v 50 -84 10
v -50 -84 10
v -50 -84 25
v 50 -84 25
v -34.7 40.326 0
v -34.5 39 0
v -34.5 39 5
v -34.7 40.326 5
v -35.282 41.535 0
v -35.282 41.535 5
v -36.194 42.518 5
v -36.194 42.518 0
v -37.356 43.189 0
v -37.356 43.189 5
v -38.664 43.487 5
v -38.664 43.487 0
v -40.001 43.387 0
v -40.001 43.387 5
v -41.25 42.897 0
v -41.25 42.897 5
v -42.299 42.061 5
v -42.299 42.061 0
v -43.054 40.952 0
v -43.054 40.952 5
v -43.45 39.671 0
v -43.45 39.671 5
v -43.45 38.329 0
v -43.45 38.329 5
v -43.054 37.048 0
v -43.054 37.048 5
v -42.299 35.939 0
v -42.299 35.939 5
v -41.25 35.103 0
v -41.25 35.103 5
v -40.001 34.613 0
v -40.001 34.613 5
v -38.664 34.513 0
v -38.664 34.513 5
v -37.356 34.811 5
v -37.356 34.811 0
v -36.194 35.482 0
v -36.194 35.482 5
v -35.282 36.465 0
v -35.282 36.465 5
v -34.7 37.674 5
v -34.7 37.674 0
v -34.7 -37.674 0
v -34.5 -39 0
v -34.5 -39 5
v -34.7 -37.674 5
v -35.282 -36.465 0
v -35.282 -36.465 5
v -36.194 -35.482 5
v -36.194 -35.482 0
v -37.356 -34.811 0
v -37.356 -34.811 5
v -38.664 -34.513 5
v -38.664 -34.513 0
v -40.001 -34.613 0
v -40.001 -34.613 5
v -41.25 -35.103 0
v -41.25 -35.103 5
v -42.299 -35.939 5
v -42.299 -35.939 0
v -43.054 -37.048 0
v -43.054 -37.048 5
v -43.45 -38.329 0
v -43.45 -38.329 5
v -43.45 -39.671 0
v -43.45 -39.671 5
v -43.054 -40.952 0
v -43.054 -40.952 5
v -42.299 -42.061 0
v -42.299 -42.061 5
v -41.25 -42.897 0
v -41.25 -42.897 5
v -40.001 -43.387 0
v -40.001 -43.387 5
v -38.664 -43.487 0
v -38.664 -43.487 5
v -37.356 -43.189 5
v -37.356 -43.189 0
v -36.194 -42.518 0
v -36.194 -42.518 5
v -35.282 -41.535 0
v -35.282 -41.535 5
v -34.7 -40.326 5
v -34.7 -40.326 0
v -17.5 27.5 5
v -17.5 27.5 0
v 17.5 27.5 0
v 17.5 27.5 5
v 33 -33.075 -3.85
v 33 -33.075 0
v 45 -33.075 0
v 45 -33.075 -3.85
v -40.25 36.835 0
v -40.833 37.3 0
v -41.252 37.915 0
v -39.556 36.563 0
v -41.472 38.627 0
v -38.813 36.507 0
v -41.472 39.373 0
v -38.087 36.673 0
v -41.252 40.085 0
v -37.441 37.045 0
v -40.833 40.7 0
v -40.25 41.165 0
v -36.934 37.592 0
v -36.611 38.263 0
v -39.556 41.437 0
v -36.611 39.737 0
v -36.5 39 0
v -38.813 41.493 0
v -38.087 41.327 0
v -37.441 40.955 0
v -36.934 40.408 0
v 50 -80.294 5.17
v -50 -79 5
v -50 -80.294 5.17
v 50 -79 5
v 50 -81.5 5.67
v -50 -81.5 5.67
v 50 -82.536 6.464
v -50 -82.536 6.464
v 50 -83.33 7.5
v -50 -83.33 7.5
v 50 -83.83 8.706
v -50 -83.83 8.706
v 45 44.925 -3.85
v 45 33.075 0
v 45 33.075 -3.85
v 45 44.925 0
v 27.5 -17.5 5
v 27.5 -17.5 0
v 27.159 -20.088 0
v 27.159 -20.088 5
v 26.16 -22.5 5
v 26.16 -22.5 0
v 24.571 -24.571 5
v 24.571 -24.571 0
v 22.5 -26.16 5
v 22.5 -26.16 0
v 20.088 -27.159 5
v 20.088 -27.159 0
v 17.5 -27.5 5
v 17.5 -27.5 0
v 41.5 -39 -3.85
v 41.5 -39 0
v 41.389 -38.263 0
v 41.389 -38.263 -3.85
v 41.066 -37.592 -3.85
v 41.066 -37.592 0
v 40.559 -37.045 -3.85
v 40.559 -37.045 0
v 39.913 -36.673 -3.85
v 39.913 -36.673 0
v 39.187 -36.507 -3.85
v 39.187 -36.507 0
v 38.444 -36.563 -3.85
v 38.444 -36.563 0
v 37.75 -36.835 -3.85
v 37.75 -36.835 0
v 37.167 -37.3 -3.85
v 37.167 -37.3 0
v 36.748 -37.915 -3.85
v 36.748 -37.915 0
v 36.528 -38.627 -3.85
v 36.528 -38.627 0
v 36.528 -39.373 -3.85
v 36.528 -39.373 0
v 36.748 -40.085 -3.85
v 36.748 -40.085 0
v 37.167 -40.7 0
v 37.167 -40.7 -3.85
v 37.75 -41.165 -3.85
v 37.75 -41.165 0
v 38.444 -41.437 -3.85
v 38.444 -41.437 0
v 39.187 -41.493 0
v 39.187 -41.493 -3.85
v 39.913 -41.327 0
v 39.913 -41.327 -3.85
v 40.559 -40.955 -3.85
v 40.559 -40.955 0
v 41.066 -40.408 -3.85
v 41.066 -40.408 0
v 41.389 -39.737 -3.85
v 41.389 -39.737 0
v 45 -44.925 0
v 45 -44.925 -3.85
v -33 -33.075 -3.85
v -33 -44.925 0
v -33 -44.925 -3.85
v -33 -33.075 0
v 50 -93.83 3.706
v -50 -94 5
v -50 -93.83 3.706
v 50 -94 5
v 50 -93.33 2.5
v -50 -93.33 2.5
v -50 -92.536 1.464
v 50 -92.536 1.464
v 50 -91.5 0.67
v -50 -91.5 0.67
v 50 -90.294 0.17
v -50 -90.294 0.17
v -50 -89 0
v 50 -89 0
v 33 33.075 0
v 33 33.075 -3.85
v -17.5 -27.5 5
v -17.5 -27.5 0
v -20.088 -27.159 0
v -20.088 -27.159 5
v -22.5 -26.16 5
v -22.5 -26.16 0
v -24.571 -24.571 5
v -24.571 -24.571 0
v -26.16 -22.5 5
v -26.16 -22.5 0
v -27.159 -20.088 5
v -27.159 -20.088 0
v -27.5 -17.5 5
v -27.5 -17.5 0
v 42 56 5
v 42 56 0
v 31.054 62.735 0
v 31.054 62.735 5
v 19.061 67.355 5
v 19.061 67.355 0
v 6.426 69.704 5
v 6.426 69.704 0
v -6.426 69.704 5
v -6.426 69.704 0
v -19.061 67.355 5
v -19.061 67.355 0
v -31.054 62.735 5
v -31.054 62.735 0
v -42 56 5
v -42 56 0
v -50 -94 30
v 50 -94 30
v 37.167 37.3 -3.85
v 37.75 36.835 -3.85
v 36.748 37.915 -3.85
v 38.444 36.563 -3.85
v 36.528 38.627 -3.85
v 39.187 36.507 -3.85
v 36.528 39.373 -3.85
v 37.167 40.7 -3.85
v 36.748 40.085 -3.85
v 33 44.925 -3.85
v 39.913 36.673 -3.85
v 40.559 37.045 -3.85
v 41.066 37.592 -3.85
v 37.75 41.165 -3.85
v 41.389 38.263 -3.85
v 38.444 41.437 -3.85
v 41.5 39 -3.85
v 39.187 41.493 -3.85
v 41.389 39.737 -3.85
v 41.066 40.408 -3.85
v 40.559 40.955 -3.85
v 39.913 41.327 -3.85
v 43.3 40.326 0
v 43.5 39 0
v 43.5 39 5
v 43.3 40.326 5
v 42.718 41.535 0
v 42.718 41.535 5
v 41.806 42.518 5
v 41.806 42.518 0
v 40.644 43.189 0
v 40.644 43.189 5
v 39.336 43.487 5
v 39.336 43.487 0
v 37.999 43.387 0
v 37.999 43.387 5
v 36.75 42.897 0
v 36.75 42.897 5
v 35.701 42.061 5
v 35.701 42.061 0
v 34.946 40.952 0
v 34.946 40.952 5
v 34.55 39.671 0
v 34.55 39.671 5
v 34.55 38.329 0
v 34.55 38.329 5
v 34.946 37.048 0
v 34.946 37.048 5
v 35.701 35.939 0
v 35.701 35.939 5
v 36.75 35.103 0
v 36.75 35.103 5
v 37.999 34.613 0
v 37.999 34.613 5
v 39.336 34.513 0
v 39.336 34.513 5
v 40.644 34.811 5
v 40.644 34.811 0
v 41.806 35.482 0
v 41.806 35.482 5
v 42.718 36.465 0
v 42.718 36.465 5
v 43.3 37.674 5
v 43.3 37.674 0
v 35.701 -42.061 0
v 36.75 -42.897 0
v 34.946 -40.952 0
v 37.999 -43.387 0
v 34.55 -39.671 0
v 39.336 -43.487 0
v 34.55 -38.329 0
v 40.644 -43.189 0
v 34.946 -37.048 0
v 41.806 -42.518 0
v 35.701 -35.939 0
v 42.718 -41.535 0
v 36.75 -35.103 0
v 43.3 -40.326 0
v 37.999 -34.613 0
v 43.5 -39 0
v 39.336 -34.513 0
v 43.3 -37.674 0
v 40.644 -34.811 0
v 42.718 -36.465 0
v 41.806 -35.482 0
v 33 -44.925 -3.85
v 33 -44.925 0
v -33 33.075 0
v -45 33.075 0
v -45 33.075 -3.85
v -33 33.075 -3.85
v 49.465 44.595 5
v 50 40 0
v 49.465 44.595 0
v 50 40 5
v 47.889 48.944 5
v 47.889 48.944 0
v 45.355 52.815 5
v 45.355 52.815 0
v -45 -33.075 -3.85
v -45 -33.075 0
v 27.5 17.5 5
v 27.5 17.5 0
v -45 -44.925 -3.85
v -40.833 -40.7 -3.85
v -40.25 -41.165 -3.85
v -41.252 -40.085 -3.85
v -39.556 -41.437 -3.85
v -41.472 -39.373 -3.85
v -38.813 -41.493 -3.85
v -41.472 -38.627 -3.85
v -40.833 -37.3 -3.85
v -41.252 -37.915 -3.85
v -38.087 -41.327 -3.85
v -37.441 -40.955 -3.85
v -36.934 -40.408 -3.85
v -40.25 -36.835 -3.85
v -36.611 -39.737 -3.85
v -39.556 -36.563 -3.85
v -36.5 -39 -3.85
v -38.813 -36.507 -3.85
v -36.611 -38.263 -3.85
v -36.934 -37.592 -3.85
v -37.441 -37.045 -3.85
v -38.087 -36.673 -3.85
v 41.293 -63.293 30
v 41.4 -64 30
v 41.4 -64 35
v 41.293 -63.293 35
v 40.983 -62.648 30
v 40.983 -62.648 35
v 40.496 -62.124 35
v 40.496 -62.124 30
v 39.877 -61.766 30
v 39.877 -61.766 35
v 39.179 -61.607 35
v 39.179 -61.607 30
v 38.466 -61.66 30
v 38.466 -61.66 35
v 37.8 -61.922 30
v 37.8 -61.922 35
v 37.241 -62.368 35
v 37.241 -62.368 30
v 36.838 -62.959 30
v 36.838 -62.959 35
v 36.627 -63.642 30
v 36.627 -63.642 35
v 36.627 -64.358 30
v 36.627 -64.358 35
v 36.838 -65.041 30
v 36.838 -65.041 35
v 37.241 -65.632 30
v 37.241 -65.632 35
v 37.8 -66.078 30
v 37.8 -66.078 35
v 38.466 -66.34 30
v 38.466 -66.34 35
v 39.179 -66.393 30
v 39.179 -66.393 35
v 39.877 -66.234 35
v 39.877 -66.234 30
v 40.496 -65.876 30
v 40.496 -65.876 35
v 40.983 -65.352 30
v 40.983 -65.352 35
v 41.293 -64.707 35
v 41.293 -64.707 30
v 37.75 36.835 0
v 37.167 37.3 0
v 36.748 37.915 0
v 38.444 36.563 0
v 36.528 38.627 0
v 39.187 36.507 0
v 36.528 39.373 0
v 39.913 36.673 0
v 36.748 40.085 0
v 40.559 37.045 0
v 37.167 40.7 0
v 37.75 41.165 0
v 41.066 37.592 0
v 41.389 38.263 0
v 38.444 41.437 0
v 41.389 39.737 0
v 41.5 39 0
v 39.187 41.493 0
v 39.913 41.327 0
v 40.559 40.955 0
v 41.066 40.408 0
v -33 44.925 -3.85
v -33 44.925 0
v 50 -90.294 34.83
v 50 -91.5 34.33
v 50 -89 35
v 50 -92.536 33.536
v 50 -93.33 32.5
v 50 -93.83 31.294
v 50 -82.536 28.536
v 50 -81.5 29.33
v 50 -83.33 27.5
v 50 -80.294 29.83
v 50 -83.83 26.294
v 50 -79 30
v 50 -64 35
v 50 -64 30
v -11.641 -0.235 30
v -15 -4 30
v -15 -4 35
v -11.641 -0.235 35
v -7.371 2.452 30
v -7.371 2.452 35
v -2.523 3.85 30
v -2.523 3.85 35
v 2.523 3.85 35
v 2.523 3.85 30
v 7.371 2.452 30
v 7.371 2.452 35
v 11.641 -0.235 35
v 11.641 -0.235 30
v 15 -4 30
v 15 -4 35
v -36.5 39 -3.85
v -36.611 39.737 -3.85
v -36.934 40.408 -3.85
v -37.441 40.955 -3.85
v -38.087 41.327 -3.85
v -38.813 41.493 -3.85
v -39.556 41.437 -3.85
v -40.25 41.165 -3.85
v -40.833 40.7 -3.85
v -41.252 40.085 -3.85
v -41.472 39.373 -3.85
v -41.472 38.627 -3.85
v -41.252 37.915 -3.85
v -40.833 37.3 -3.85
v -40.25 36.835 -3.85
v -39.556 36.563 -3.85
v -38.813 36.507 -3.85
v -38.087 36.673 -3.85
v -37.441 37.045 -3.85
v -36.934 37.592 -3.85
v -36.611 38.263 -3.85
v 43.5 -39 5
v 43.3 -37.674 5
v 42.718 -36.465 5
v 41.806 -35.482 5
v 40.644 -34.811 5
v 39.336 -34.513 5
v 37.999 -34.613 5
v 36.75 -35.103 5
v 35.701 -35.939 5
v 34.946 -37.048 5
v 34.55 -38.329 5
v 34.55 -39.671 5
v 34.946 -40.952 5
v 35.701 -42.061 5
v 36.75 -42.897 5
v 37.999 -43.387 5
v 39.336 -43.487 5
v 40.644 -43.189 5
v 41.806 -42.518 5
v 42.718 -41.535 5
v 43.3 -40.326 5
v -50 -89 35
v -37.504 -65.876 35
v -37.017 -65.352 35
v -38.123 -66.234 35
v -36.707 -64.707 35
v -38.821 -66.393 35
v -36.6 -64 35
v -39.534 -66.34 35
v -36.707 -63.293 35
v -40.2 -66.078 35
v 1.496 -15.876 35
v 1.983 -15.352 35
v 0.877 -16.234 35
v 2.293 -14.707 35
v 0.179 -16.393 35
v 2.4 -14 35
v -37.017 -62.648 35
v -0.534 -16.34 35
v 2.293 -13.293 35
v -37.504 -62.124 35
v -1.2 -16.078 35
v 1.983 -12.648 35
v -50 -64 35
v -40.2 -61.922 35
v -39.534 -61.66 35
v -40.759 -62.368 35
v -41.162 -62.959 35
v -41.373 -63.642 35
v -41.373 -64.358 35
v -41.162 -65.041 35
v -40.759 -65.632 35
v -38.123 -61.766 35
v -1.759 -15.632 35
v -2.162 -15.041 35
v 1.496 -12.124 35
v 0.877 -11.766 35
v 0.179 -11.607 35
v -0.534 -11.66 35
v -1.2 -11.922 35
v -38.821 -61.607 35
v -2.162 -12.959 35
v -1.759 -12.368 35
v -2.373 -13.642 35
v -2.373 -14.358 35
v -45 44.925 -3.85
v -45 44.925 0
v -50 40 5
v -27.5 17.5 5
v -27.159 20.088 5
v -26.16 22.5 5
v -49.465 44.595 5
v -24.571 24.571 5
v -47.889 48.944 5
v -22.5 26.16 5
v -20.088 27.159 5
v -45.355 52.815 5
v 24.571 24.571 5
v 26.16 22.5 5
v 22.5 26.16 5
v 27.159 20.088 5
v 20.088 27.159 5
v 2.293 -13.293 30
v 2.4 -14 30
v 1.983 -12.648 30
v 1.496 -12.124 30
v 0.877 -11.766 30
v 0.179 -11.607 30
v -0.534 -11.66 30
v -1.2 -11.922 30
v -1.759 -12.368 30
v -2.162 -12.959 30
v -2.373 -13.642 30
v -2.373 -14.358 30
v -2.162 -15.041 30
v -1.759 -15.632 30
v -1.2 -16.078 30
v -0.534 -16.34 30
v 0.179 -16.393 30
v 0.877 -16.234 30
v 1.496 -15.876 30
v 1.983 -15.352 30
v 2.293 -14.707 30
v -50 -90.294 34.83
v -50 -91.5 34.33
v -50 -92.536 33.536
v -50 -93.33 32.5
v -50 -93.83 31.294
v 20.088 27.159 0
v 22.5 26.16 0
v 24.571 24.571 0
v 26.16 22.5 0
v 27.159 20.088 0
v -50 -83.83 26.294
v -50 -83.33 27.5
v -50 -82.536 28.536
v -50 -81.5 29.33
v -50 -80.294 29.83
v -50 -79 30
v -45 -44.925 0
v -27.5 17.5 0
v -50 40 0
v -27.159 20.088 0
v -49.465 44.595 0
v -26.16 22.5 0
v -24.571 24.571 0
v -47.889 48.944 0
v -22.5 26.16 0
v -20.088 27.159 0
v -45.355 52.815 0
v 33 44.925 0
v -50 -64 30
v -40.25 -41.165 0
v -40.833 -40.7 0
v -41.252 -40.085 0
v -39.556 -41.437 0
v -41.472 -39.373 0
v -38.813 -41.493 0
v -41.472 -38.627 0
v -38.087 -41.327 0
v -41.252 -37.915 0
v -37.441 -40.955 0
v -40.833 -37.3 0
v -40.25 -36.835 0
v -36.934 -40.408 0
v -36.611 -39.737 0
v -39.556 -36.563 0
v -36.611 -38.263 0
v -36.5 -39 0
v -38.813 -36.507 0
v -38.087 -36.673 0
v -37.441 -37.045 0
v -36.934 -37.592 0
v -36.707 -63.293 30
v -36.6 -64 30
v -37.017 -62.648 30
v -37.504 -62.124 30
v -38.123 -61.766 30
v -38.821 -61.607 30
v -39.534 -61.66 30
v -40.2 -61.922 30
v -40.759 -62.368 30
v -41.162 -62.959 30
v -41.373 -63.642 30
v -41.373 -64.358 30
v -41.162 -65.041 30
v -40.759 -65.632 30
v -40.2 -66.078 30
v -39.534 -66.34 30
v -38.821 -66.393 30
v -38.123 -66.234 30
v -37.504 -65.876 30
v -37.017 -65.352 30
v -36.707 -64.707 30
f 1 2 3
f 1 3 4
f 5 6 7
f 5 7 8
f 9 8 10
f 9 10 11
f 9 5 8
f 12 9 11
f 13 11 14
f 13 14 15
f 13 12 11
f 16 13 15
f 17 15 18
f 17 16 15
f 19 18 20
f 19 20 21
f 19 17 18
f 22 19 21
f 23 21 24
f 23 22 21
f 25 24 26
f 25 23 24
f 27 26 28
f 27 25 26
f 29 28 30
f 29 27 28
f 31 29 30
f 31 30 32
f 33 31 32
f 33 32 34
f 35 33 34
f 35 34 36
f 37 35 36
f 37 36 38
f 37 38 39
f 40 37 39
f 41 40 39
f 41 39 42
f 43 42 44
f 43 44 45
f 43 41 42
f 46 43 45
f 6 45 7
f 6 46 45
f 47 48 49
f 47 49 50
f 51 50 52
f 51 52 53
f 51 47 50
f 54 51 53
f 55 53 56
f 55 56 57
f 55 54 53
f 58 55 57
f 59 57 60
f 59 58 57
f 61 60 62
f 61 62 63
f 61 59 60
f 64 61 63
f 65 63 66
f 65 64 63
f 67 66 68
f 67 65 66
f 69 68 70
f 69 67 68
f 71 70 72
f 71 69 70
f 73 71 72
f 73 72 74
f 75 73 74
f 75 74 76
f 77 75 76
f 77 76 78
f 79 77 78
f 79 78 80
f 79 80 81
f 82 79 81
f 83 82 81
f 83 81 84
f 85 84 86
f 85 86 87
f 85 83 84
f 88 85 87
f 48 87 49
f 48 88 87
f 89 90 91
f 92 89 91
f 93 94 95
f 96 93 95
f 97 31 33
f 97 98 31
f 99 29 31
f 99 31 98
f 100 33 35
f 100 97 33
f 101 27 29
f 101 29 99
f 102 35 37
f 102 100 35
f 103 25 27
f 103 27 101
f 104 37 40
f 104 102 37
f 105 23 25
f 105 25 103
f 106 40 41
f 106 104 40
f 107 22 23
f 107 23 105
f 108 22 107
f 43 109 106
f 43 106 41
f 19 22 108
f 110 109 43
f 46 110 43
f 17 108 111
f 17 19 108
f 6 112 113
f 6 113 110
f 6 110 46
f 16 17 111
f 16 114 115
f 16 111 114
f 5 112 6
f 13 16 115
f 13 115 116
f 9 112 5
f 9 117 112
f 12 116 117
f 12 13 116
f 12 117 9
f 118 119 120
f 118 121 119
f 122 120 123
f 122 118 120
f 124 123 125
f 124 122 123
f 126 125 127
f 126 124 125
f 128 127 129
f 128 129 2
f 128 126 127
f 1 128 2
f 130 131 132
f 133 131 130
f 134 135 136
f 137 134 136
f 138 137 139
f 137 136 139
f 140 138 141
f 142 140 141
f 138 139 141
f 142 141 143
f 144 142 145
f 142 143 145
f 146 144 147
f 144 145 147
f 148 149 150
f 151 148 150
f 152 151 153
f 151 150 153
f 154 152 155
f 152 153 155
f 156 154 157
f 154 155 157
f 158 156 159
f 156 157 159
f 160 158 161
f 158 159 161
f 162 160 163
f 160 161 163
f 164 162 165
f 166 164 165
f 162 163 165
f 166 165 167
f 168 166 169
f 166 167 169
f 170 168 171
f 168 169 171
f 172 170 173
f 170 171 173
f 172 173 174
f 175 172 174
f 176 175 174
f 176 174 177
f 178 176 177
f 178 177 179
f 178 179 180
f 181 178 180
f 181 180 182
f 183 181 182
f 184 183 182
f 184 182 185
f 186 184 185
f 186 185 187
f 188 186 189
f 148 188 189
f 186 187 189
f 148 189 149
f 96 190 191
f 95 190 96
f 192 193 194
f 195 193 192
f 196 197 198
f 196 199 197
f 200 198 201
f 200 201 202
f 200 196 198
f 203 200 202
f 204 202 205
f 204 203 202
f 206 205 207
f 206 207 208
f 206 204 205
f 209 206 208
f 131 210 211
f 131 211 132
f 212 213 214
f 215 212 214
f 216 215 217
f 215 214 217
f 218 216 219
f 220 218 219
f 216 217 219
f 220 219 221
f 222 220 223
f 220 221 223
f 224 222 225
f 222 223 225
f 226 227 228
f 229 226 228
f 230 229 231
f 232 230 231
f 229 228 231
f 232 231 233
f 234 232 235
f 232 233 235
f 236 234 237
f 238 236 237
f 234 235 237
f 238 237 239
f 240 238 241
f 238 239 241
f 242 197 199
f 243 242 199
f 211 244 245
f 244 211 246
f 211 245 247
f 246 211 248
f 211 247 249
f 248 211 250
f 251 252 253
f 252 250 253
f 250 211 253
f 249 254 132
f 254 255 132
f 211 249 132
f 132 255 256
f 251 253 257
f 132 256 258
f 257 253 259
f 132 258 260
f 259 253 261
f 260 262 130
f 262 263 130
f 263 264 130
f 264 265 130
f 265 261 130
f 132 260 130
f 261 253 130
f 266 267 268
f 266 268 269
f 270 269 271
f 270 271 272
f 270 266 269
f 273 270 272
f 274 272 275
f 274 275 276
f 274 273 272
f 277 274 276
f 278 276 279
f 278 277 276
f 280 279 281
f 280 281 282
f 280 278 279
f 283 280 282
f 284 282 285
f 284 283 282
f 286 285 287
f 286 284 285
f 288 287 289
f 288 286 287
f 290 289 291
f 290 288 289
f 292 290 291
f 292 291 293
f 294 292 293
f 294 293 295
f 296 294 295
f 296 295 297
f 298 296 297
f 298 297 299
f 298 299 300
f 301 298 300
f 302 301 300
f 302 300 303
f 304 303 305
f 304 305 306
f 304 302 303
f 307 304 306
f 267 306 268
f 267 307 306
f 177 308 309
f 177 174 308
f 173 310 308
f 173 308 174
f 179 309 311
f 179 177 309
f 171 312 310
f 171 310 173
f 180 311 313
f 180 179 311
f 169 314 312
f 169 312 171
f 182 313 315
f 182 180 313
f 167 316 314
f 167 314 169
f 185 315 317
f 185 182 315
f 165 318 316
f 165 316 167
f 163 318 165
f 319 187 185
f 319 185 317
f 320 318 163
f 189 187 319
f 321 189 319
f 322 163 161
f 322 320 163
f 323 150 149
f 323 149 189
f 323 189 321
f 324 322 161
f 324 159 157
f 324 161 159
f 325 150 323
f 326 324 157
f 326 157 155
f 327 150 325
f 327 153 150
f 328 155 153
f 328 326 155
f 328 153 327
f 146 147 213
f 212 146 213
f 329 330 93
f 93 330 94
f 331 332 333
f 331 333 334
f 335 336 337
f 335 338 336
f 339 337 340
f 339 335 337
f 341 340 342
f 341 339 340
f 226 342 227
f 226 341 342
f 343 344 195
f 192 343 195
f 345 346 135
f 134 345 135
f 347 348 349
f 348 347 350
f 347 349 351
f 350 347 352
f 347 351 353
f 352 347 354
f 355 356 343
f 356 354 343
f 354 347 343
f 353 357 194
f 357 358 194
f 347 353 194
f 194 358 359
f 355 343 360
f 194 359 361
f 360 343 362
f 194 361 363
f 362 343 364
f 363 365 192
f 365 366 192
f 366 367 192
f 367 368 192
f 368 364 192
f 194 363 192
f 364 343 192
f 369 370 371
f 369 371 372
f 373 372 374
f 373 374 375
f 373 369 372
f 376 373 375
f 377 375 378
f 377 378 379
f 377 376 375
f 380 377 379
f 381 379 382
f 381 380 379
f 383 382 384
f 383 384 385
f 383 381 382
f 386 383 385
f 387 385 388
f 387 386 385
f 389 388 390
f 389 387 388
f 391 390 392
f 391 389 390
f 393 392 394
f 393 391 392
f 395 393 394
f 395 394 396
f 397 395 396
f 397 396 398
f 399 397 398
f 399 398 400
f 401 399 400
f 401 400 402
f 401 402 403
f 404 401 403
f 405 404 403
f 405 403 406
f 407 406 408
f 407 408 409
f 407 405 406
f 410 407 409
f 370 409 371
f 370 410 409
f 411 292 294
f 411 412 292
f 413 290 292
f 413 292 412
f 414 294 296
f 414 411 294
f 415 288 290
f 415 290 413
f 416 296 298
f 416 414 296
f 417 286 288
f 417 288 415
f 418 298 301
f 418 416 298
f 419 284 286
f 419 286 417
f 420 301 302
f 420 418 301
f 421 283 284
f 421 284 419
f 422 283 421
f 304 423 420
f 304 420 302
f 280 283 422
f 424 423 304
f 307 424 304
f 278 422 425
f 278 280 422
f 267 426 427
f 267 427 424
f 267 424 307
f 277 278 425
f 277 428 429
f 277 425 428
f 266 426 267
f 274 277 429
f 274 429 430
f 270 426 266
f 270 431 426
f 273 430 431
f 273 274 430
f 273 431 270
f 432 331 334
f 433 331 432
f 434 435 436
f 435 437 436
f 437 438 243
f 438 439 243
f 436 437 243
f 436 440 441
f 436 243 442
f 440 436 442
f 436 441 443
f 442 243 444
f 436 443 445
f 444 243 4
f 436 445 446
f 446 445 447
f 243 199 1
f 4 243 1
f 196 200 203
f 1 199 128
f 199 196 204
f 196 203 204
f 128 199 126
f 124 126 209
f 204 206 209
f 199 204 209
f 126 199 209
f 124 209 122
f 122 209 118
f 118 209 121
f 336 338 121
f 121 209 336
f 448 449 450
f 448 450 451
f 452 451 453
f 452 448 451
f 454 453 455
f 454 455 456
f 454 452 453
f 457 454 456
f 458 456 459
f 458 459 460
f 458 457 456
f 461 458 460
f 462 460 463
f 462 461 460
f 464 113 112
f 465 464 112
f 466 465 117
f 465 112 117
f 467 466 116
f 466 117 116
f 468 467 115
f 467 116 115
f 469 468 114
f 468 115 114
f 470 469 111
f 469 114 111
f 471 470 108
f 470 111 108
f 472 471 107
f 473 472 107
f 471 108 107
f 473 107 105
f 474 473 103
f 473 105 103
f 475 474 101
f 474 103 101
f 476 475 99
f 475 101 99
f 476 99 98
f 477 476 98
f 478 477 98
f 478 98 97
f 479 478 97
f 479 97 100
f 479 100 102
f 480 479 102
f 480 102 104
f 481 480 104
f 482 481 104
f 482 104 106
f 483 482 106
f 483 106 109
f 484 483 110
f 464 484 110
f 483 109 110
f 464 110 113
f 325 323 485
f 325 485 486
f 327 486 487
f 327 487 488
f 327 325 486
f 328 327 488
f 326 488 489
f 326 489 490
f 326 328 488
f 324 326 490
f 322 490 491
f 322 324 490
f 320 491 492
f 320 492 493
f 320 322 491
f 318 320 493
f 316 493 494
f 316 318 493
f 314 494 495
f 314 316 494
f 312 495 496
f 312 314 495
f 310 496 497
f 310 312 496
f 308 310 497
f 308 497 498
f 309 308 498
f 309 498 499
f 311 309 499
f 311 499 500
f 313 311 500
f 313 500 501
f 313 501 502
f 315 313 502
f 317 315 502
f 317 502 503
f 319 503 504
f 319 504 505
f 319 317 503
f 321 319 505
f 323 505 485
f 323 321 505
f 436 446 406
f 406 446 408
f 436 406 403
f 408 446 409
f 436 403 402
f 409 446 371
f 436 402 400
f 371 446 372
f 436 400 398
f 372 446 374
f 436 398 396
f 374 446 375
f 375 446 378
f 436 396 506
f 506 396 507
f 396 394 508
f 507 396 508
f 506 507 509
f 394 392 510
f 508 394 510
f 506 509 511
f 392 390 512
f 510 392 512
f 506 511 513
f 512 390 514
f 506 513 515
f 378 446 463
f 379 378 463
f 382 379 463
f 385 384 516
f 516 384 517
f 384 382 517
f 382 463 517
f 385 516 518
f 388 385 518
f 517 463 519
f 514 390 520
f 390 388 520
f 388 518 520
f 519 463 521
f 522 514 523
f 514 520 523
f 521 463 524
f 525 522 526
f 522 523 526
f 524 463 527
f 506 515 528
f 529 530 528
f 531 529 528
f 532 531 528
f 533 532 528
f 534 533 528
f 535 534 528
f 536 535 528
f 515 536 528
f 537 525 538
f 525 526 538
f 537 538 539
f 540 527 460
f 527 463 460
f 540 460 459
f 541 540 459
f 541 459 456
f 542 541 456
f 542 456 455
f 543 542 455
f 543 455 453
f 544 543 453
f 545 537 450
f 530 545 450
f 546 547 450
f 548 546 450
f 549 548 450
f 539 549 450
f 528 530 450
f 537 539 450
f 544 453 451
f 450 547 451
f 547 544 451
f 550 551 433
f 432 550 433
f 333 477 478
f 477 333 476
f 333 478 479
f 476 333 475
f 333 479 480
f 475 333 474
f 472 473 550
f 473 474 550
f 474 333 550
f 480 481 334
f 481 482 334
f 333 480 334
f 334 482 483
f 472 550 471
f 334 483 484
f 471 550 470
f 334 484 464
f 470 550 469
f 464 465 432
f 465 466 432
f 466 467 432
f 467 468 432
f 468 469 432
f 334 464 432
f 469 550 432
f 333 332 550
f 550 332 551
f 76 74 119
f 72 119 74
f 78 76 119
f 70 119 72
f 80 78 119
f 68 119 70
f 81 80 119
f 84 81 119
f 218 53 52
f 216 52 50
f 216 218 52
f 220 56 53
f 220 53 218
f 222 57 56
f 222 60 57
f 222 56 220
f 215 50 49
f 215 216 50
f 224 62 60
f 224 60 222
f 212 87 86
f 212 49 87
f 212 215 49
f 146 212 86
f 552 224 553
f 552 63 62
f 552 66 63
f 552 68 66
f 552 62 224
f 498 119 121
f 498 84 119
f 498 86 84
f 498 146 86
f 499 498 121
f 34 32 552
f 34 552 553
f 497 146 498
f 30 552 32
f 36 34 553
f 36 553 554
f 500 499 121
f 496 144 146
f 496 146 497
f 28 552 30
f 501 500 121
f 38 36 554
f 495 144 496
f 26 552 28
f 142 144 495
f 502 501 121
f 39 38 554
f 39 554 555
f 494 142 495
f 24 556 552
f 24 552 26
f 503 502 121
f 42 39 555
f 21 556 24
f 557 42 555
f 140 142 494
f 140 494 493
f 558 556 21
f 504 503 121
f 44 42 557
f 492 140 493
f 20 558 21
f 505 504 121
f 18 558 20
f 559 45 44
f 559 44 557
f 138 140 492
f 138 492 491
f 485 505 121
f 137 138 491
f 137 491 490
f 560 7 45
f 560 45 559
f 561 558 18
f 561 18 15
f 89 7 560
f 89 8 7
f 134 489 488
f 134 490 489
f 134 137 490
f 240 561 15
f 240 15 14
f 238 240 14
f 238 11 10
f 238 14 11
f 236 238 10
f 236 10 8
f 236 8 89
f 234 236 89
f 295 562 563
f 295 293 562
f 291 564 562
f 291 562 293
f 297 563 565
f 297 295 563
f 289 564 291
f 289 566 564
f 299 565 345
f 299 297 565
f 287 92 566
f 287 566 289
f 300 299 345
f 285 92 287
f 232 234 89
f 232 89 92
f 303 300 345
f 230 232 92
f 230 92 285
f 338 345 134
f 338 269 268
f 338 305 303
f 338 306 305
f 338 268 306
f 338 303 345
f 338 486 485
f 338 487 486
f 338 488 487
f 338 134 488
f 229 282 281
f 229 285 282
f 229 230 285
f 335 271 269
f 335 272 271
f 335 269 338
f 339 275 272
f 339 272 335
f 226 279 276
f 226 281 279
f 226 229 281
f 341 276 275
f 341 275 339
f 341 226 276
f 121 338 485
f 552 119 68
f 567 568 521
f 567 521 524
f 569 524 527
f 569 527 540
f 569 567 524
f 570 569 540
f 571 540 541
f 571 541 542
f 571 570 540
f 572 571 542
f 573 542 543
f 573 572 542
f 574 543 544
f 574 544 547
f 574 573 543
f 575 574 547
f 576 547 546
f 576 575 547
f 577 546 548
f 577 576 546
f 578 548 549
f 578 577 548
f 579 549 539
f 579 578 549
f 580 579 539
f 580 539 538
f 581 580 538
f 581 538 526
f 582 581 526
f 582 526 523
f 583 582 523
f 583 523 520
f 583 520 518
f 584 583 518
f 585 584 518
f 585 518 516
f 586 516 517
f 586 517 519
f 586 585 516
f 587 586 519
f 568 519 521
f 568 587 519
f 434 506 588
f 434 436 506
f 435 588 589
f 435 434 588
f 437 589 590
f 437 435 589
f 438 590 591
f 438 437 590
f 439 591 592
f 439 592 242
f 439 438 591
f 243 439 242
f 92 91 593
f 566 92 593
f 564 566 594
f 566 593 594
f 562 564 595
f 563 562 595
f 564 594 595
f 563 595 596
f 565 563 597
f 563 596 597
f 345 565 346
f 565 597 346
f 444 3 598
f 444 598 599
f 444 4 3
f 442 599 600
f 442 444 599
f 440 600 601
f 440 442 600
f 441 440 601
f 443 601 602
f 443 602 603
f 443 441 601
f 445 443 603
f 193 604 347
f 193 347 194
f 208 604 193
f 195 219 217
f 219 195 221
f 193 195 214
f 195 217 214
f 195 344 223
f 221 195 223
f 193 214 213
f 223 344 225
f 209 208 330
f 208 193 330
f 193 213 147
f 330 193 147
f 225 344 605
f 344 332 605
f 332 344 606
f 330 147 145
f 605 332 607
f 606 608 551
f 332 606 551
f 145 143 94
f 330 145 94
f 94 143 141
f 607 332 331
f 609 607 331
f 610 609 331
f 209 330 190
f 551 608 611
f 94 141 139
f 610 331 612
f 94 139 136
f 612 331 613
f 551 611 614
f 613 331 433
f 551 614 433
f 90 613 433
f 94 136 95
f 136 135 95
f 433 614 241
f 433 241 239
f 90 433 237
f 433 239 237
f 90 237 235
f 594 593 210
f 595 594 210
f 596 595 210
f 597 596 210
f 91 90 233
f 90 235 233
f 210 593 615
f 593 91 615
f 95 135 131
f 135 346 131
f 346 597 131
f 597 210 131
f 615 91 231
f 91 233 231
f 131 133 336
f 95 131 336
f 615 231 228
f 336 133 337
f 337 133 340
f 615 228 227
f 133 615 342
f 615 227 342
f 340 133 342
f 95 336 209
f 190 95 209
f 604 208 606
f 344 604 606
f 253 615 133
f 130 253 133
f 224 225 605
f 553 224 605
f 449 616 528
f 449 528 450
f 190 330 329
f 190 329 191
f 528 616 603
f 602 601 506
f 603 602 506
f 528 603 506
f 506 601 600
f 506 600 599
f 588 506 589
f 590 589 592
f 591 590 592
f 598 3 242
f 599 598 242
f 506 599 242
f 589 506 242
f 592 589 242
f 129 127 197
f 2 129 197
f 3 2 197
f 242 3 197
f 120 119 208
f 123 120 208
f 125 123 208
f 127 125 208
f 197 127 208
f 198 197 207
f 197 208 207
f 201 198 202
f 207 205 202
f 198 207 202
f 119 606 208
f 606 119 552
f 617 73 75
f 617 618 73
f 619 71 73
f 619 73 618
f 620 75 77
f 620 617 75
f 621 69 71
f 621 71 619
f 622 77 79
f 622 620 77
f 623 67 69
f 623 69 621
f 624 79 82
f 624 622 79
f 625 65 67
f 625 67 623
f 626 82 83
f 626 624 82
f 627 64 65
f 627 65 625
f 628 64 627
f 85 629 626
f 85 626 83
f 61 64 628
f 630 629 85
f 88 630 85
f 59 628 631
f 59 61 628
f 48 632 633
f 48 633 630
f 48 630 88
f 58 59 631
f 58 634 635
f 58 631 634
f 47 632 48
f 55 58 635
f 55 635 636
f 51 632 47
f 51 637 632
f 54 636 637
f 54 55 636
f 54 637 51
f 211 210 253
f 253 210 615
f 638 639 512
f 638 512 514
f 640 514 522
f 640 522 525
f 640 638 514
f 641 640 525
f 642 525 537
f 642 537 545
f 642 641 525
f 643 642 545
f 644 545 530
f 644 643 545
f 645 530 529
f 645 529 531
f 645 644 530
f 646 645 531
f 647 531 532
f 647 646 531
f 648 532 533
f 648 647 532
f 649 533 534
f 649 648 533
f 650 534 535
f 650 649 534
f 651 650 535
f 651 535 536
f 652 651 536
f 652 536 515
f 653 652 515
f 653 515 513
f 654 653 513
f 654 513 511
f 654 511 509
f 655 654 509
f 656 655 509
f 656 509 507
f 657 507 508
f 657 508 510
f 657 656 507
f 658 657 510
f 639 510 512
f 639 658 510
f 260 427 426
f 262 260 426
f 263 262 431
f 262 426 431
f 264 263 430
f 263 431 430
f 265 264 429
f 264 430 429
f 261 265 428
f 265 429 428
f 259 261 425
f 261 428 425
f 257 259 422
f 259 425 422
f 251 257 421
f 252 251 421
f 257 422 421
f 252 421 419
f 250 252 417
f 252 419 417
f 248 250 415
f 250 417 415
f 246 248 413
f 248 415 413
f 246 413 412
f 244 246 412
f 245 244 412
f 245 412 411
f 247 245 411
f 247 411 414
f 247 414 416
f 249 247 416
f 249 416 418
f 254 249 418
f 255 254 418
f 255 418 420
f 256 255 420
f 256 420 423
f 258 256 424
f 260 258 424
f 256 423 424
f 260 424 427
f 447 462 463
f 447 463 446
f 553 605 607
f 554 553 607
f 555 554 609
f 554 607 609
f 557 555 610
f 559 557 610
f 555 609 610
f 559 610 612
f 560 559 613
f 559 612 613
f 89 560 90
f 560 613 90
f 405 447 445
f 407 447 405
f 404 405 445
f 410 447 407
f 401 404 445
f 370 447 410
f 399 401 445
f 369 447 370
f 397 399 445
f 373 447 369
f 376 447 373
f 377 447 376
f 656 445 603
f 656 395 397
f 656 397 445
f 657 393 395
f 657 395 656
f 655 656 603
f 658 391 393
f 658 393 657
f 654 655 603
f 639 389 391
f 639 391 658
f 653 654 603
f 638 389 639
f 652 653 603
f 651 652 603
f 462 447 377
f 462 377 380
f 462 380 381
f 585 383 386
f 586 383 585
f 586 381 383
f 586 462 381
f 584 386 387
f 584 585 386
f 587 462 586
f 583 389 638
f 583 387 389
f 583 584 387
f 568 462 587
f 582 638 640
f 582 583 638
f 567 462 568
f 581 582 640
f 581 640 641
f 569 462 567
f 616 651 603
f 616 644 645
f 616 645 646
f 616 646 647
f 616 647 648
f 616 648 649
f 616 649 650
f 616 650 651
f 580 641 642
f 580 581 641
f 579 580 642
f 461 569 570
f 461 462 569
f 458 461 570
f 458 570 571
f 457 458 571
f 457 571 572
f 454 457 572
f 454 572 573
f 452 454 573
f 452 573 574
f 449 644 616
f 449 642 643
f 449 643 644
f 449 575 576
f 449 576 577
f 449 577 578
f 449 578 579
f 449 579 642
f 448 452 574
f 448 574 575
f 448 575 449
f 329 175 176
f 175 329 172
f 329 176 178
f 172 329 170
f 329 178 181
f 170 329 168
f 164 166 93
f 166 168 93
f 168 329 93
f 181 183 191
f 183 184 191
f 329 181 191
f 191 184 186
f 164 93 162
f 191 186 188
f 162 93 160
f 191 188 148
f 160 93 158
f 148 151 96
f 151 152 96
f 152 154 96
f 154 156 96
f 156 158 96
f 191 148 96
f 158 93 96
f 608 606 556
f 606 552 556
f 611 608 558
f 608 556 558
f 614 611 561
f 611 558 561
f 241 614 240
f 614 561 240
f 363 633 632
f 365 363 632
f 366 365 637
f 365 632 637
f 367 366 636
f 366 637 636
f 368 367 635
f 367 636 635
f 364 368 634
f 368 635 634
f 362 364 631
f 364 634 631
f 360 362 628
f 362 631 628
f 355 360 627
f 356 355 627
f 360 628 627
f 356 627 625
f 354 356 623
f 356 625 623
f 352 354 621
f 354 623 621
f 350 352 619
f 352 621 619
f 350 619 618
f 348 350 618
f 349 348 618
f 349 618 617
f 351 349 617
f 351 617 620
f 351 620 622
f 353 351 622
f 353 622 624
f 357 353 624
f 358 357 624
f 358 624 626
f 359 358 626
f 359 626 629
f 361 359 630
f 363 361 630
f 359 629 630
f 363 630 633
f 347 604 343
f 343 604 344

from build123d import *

# Parameters (mm, degrees)
SKETCH_1_R          = 4.5
EXTRUDE_2_DEPTH     = 5
FILLET1_R           = 20
SKETCH_1_5_W        = 12
SKETCH_1_5_H        = 11.85
SKETCH_1_5_R        = 2.5
BOSS_EXTRUDE1_DEPTH = 3.85
BOSS_EXTRUDE3_DEPTH = 5
SKETCH1_3_W         = 100
SKETCH1_3_H         = 10
BOSS_EXTRUDE4_DEPTH = 30
SKETCH2_R           = 2.4
BOSS_EXTRUDE5_DEPTH = 5
FILLET2_R           = 5


with BuildPart() as part:
    # Эскиз1 → Extrude 2 (new body)
    with BuildSketch(Plane.XY):
        with BuildLine():
            ThreePointArc((-50, -48.989794856), (0, -70), (50, -48.989794856))
            Line((50, -48.989794856), (50, 48.989794856))
            ThreePointArc((50, 48.989794856), (0, 70), (-50, 48.989794856))
            Line((-50, 48.989794856), (-50, -48.989794856))
        make_face()
        with BuildLine():
            ThreePointArc((27.5, -17.5), (24.571067812, -24.571067812), (17.5, -27.5))
            Line((17.5, -27.5), (-17.5, -27.5))
            ThreePointArc((-17.5, -27.5), (-24.571067812, -24.571067812), (-27.5, -17.5))
            Line((-27.5, -17.5), (-27.5, 17.5))
            ThreePointArc((-27.5, 17.5), (-24.571067812, 24.571067812), (-17.5, 27.5))
            Line((-17.5, 27.5), (17.5, 27.5))
            ThreePointArc((17.5, 27.5), (24.571067812, 24.571067812), (27.5, 17.5))
            Line((27.5, 17.5), (27.5, -17.5))
        make_face(mode=Mode.SUBTRACT)
        with Locations((-39, -39)):
            Circle(SKETCH_1_R, mode=Mode.SUBTRACT)
        with Locations((-39, 39)):
            Circle(SKETCH_1_R, mode=Mode.SUBTRACT)
        with Locations((39, 39)):
            Circle(SKETCH_1_R, mode=Mode.SUBTRACT)
        with Locations((39, -39)):
            Circle(SKETCH_1_R, mode=Mode.SUBTRACT)
    extrude(amount=EXTRUDE_2_DEPTH)

    # Fillet1
    fillet1_edges = [part.edges().sort_by_distance(p)[0] for p in [
        (50, -48.989794856, 2.5),
        (-50, -48.989794856, 2.5),
        (-50, 48.989794856, 2.5),
        (50, 48.989794856, 2.5),
    ]]
    fillet(fillet1_edges, radius=FILLET1_R)

    # Эскиз1<5> → Boss-Extrude1 (add)
    # profile 1 of 4: a face of its own
    with BuildSketch(Plane.XY):
        with Locations((39, -39)):
            Rectangle(SKETCH_1_5_W, SKETCH_1_5_H)
        with Locations((39, -39)):
            Circle(SKETCH_1_5_R, mode=Mode.SUBTRACT)
    # profile 2 of 4: a face of its own
    with BuildSketch(Plane.XY):
        with Locations((-39, -39)):
            Rectangle(SKETCH_1_5_W, SKETCH_1_5_H)
        with Locations((-39, -39)):
            Circle(SKETCH_1_5_R, mode=Mode.SUBTRACT)
    # profile 3 of 4: a face of its own
    with BuildSketch(Plane.XY):
        with Locations((39, 39)):
            Rectangle(SKETCH_1_5_W, SKETCH_1_5_H)
        with Locations((39, 39)):
            Circle(SKETCH_1_5_R, mode=Mode.SUBTRACT)
    # profile 4 of 4: a face of its own
    with BuildSketch(Plane.XY):
        with Locations((-39, 39)):
            Rectangle(SKETCH_1_5_W, SKETCH_1_5_H)
        with Locations((-39, 39)):
            Circle(SKETCH_1_5_R, mode=Mode.SUBTRACT)
    extrude(amount=-BOSS_EXTRUDE1_DEPTH)

    # Sketch1 → Boss-Extrude3 (add)
    with BuildSketch(Plane.XY):
        with BuildLine():
            ThreePointArc((50, -40), (0, -60.710678119), (-50, -40))
            Line((-50, -40), (-50, -84))
            Line((-50, -84), (50, -84))
            Line((50, -84), (50, -40))
        make_face()
    extrude(amount=BOSS_EXTRUDE3_DEPTH)

    # Sketch1<3> → Boss-Extrude4 (add)
    with BuildSketch(Plane.XY):
        with Locations((0, -89)):
            Rectangle(SKETCH1_3_W, SKETCH1_3_H)
    extrude(amount=BOSS_EXTRUDE4_DEPTH)

    # Sketch2 → Boss-Extrude5 (add)
    with BuildSketch(Plane.XY.offset(30)):
        with BuildLine():
            Line((-50, -64), (-50, -94))
            Line((-50, -94), (50, -94))
            Line((50, -94), (50, -64))
            Line((50, -64), (15, -4))
            ThreePointArc((15, -4), (0, 4.027756377), (-15, -4))
            Line((-15, -4), (-50, -64))
        make_face()
        with Locations((-39, -64)):
            Circle(SKETCH2_R, mode=Mode.SUBTRACT)
        with Locations((39, -64)):
            Circle(SKETCH2_R, mode=Mode.SUBTRACT)
        with Locations((0, -14)):
            Circle(SKETCH2_R, mode=Mode.SUBTRACT)
    extrude(amount=BOSS_EXTRUDE5_DEPTH)

    # Fillet2
    fillet2_edges = [part.edges().sort_by_distance(p)[0] for p in [
        (0, -94, 0),
        (0, -94, 35),
        (0, -84, 30),
        (0, -84, 5),
    ]]
    fillet(fillet2_edges, radius=FILLET2_R)


solid = part.part
